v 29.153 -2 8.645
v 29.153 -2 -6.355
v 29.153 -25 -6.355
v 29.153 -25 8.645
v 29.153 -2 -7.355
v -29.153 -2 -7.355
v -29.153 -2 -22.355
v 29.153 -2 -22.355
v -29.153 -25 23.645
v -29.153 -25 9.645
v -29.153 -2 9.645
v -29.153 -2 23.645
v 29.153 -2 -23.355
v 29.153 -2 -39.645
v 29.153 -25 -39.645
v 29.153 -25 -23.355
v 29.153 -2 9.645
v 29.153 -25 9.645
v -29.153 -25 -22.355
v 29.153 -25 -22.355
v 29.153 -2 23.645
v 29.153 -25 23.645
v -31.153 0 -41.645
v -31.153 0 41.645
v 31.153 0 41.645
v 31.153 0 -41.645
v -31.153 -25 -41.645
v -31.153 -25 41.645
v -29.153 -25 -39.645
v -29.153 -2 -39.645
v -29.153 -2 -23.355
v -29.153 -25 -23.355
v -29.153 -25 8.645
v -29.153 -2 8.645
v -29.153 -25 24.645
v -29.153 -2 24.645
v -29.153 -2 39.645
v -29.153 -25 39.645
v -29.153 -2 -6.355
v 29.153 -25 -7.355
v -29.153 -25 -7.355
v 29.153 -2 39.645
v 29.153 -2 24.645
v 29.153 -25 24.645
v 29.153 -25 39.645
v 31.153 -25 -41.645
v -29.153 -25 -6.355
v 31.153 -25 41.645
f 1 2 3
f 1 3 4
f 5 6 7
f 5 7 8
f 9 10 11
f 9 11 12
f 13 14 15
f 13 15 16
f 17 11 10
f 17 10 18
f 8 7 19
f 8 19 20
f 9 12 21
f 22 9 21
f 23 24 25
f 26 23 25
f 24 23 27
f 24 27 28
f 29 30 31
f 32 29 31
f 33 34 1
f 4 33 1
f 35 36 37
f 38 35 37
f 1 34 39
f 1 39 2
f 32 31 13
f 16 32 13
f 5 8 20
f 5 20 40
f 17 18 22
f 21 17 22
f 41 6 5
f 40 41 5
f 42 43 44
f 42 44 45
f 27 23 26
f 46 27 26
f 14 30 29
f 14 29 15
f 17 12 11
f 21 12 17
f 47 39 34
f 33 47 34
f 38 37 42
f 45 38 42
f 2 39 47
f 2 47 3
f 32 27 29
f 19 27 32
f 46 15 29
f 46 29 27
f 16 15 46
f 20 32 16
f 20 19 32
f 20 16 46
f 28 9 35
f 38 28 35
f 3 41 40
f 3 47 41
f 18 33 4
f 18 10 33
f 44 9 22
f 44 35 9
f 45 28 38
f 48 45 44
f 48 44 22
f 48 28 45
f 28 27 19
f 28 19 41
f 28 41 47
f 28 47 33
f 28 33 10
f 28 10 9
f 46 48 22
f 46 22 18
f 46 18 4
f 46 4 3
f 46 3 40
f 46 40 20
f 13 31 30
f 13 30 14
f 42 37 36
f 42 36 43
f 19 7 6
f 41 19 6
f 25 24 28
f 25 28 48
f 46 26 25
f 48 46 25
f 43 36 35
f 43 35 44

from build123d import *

# Parameters (mm, degrees)
F0_W     = 62.305648
F0_H     = 83.289184
F0_W_2   = 58.305648
F0_H_2   = 79.289184
F1_DEPTH = 25
F2_DEPTH = 2
F3_W     = 58.305648
F3_H     = 1
F4_DEPTH = 23


with BuildPart() as f1:
    # F0 (on Front) → F1 (new body)
    with BuildSketch(Plane.XZ):
        Rectangle(F0_W, F0_H)
        Rectangle(F0_W_2, F0_H_2, mode=Mode.SUBTRACT)
    extrude(amount=F1_DEPTH)

    # F0 (on Front) → F2 (join)
    with BuildSketch(Plane.XZ):
        Rectangle(F0_W_2, F0_H_2)
    extrude(amount=F2_DEPTH)

    # F3 (on face) → F4 (join)
    with BuildSketch(Plane.XZ.offset(2)):
        with Locations((0, 24.144592)):
            Rectangle(F3_W, F3_H)
        with Locations((0, 9.144592)):
            Rectangle(F3_W, F3_H)
        with Locations((0, -6.855408)):
            Rectangle(F3_W, F3_H)
        with Locations((0, -22.855408)):
            Rectangle(F3_W, F3_H)
    extrude(amount=F4_DEPTH)


solid = f1.part
